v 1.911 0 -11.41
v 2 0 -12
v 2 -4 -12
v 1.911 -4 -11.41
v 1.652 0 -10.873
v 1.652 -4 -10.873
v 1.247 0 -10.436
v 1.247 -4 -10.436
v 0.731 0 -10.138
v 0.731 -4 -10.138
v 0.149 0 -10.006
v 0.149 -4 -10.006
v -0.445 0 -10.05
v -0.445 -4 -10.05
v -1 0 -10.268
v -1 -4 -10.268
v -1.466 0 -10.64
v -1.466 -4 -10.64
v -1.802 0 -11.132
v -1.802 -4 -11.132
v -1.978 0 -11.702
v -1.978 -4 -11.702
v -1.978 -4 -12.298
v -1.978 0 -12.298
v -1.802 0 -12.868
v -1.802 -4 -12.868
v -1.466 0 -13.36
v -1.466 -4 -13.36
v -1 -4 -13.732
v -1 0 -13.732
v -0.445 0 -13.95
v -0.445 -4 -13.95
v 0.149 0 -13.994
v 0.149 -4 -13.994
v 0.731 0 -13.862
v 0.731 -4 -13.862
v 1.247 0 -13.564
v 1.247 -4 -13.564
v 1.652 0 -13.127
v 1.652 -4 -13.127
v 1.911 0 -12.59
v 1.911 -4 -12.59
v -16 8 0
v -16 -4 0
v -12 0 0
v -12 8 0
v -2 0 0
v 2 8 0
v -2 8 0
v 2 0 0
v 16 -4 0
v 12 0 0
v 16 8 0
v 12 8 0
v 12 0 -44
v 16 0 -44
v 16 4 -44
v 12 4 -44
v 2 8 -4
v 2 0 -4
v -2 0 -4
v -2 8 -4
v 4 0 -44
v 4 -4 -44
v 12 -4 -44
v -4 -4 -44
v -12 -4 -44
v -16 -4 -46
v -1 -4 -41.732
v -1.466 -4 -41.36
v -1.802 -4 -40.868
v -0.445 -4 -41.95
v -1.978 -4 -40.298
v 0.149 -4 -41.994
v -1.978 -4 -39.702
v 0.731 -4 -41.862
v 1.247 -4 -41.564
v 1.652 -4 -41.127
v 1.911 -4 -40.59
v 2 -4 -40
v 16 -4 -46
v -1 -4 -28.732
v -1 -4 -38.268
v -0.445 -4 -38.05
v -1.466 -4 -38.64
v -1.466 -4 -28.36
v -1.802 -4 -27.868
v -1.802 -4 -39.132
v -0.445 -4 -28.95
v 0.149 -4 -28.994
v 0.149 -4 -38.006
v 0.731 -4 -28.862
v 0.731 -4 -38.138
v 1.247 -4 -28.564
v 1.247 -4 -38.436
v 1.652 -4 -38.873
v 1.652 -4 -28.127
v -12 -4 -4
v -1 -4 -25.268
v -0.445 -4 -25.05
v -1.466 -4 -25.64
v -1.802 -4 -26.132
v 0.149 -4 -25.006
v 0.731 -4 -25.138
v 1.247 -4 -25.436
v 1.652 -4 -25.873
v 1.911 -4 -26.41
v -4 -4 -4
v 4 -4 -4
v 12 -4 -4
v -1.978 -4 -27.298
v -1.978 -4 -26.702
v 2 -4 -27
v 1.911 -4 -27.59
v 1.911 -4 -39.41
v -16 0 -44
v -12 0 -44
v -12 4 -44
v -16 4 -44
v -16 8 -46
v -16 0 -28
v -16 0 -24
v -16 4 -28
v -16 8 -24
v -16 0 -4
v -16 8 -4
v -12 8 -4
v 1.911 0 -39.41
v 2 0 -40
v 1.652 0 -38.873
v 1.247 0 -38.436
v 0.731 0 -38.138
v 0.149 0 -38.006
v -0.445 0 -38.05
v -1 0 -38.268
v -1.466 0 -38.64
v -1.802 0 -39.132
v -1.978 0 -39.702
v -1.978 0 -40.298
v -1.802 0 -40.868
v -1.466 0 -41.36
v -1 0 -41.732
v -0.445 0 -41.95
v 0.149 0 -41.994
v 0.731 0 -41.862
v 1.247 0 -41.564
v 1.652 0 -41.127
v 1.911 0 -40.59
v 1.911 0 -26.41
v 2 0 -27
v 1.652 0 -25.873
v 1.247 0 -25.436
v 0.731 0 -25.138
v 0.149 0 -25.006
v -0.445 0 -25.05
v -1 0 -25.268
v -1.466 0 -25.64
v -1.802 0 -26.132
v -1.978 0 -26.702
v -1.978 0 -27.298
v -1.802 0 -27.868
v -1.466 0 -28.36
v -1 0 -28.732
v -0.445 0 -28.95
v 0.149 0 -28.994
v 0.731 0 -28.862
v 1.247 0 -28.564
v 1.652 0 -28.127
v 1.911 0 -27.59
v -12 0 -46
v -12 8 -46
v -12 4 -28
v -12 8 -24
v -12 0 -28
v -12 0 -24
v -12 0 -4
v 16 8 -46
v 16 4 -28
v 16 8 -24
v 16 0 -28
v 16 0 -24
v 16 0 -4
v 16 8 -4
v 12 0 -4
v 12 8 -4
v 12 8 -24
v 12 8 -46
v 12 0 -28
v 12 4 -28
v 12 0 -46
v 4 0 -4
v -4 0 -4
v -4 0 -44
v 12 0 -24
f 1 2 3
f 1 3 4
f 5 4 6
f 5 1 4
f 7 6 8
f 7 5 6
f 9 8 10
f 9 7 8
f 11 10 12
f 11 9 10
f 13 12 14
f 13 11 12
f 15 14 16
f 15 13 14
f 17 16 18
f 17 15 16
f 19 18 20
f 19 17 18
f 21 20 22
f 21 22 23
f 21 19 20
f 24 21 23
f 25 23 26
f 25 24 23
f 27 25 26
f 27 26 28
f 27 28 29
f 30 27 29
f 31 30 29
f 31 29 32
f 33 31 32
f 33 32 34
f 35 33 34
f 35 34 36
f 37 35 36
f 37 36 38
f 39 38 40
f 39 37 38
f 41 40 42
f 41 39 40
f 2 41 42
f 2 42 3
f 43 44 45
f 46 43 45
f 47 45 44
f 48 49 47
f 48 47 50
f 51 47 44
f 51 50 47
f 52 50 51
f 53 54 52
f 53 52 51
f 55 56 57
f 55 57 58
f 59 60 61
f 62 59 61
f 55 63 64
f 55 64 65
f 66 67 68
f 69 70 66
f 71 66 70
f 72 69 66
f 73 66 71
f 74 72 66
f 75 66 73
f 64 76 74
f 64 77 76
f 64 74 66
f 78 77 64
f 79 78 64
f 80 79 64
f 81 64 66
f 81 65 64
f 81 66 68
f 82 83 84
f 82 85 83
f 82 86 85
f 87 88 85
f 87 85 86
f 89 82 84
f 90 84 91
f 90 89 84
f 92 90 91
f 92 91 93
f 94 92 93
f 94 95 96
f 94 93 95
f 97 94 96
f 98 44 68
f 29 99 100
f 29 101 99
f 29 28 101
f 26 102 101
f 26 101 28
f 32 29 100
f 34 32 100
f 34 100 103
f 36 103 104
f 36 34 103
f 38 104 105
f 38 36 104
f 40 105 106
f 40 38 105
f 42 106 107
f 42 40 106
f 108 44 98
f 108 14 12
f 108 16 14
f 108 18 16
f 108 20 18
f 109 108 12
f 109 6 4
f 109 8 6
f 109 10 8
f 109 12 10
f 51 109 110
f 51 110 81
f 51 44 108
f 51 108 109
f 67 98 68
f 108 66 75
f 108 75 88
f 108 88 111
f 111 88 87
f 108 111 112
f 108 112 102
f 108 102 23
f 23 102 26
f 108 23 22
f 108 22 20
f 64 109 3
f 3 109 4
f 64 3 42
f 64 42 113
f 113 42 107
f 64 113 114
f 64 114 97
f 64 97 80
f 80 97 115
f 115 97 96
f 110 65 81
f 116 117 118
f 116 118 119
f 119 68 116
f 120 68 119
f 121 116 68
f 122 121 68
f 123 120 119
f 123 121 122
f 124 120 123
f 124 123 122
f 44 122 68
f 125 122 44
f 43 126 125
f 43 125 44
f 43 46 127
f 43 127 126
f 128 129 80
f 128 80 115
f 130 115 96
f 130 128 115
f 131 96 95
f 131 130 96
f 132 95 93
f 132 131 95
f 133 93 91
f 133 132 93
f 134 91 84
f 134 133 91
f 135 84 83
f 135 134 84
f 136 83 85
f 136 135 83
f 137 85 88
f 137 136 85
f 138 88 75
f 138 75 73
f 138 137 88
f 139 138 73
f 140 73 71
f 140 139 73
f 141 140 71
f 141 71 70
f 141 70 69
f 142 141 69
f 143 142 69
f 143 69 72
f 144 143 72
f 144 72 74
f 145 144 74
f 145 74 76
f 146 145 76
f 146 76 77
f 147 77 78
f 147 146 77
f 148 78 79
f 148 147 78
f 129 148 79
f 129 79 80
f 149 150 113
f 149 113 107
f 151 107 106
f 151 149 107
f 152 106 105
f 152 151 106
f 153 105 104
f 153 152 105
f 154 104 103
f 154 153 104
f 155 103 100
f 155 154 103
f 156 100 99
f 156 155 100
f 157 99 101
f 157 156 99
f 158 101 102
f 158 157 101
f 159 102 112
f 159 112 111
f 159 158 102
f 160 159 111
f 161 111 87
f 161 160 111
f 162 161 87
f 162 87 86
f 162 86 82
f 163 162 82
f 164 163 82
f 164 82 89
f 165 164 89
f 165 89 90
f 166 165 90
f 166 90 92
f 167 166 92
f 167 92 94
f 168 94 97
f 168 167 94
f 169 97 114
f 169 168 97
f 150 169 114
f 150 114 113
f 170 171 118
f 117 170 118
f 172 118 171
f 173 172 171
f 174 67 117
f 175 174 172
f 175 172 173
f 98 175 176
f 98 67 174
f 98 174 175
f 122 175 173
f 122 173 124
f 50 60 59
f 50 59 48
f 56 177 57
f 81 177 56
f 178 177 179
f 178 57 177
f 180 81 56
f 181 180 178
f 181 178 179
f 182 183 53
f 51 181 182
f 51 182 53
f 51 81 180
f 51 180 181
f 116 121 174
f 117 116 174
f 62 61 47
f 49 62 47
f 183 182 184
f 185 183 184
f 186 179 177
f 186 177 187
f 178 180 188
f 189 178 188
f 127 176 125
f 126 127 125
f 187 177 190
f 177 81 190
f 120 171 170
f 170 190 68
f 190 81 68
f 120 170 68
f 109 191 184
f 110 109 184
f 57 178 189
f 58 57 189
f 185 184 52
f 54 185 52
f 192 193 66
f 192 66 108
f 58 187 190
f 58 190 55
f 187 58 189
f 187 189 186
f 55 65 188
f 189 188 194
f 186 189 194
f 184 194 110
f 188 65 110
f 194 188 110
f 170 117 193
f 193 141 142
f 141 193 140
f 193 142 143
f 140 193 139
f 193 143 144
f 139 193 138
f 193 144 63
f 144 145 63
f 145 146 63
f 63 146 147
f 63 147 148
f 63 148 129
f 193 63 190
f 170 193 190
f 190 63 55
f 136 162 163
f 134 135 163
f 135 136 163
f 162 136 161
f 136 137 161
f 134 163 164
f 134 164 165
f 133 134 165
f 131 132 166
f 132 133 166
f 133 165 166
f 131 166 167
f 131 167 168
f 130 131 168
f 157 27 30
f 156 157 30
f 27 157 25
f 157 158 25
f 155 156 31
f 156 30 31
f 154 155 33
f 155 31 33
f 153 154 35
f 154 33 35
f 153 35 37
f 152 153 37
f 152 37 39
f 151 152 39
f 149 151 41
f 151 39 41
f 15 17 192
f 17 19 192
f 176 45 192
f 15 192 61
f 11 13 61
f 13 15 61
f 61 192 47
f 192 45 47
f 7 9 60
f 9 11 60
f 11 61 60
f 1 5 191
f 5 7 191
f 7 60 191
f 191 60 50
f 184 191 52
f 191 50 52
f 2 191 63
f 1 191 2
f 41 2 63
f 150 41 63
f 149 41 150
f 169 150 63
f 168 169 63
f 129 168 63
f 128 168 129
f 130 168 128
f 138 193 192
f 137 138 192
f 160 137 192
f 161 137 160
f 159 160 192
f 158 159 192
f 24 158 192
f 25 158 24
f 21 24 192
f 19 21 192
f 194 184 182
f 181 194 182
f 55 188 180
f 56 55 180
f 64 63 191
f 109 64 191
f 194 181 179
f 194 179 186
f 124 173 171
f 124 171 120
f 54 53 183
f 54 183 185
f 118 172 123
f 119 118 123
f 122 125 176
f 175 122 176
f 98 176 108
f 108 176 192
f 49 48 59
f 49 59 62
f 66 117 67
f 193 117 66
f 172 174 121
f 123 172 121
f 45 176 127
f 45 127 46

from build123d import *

# Parameters (mm, degrees)
F0_W     = 32
F0_H     = 46
F0_W_2   = 8
F0_H_2   = 40
F0_R     = 2
F1_DEPTH = 4
F2_W     = 4
F2_H     = 2
F2_H_2   = 4
F3_DEPTH = 8
F4_W     = 4
F4_H     = 22
F5_DEPTH = 4


with BuildPart() as f1:
    # F0 (on Front) → F1 (new body)
    with BuildSketch(Plane.XZ):
        with Locations((0, -23)):
            Rectangle(F0_W, F0_H)
        with Locations((-8, -24)):
            Rectangle(F0_W_2, F0_H_2, mode=Mode.SUBTRACT)
        with Locations((0, -40)):
            Circle(F0_R, mode=Mode.SUBTRACT)
        with Locations((0, -27)):
            Circle(F0_R, mode=Mode.SUBTRACT)
        with Locations((8, -24)):
            Rectangle(F0_W_2, F0_H_2, mode=Mode.SUBTRACT)
        with Locations((0, -12)):
            Circle(F0_R, mode=Mode.SUBTRACT)
    extrude(amount=F1_DEPTH)

    # F2 (on face) → F3 (join)
    with BuildSketch(Plane(origin=(0, 0, 0), x_dir=(-1, 0, 0), z_dir=(0, 1, 0))):
        with Locations((-14, -45)):
            Rectangle(F2_W, F2_H)
        with Locations((14, -45)):
            Rectangle(F2_W, F2_H)
        with Locations((-14, -2)):
            Rectangle(F2_W, F2_H_2)
        with Locations((14, -2)):
            Rectangle(F2_W, F2_H_2)
        with Locations((0, -2)):
            Rectangle(F2_W, F2_H_2)
        with Locations((-14, -26)):
            Rectangle(F2_W, F2_H_2)
        with Locations((14, -26)):
            Rectangle(F2_W, F2_H_2)
    extrude(amount=F3_DEPTH)

    # F4 (on face) → F5 (join)
    with BuildSketch(Plane(origin=(0, 8, 0), x_dir=(-1, 0, 0), z_dir=(0, 1, 0))):
        with Locations((-14, -35)):
            Rectangle(F4_W, F4_H)
        with Locations((14, -35)):
            Rectangle(F4_W, F4_H)
    extrude(amount=-F5_DEPTH)


solid = f1.part
